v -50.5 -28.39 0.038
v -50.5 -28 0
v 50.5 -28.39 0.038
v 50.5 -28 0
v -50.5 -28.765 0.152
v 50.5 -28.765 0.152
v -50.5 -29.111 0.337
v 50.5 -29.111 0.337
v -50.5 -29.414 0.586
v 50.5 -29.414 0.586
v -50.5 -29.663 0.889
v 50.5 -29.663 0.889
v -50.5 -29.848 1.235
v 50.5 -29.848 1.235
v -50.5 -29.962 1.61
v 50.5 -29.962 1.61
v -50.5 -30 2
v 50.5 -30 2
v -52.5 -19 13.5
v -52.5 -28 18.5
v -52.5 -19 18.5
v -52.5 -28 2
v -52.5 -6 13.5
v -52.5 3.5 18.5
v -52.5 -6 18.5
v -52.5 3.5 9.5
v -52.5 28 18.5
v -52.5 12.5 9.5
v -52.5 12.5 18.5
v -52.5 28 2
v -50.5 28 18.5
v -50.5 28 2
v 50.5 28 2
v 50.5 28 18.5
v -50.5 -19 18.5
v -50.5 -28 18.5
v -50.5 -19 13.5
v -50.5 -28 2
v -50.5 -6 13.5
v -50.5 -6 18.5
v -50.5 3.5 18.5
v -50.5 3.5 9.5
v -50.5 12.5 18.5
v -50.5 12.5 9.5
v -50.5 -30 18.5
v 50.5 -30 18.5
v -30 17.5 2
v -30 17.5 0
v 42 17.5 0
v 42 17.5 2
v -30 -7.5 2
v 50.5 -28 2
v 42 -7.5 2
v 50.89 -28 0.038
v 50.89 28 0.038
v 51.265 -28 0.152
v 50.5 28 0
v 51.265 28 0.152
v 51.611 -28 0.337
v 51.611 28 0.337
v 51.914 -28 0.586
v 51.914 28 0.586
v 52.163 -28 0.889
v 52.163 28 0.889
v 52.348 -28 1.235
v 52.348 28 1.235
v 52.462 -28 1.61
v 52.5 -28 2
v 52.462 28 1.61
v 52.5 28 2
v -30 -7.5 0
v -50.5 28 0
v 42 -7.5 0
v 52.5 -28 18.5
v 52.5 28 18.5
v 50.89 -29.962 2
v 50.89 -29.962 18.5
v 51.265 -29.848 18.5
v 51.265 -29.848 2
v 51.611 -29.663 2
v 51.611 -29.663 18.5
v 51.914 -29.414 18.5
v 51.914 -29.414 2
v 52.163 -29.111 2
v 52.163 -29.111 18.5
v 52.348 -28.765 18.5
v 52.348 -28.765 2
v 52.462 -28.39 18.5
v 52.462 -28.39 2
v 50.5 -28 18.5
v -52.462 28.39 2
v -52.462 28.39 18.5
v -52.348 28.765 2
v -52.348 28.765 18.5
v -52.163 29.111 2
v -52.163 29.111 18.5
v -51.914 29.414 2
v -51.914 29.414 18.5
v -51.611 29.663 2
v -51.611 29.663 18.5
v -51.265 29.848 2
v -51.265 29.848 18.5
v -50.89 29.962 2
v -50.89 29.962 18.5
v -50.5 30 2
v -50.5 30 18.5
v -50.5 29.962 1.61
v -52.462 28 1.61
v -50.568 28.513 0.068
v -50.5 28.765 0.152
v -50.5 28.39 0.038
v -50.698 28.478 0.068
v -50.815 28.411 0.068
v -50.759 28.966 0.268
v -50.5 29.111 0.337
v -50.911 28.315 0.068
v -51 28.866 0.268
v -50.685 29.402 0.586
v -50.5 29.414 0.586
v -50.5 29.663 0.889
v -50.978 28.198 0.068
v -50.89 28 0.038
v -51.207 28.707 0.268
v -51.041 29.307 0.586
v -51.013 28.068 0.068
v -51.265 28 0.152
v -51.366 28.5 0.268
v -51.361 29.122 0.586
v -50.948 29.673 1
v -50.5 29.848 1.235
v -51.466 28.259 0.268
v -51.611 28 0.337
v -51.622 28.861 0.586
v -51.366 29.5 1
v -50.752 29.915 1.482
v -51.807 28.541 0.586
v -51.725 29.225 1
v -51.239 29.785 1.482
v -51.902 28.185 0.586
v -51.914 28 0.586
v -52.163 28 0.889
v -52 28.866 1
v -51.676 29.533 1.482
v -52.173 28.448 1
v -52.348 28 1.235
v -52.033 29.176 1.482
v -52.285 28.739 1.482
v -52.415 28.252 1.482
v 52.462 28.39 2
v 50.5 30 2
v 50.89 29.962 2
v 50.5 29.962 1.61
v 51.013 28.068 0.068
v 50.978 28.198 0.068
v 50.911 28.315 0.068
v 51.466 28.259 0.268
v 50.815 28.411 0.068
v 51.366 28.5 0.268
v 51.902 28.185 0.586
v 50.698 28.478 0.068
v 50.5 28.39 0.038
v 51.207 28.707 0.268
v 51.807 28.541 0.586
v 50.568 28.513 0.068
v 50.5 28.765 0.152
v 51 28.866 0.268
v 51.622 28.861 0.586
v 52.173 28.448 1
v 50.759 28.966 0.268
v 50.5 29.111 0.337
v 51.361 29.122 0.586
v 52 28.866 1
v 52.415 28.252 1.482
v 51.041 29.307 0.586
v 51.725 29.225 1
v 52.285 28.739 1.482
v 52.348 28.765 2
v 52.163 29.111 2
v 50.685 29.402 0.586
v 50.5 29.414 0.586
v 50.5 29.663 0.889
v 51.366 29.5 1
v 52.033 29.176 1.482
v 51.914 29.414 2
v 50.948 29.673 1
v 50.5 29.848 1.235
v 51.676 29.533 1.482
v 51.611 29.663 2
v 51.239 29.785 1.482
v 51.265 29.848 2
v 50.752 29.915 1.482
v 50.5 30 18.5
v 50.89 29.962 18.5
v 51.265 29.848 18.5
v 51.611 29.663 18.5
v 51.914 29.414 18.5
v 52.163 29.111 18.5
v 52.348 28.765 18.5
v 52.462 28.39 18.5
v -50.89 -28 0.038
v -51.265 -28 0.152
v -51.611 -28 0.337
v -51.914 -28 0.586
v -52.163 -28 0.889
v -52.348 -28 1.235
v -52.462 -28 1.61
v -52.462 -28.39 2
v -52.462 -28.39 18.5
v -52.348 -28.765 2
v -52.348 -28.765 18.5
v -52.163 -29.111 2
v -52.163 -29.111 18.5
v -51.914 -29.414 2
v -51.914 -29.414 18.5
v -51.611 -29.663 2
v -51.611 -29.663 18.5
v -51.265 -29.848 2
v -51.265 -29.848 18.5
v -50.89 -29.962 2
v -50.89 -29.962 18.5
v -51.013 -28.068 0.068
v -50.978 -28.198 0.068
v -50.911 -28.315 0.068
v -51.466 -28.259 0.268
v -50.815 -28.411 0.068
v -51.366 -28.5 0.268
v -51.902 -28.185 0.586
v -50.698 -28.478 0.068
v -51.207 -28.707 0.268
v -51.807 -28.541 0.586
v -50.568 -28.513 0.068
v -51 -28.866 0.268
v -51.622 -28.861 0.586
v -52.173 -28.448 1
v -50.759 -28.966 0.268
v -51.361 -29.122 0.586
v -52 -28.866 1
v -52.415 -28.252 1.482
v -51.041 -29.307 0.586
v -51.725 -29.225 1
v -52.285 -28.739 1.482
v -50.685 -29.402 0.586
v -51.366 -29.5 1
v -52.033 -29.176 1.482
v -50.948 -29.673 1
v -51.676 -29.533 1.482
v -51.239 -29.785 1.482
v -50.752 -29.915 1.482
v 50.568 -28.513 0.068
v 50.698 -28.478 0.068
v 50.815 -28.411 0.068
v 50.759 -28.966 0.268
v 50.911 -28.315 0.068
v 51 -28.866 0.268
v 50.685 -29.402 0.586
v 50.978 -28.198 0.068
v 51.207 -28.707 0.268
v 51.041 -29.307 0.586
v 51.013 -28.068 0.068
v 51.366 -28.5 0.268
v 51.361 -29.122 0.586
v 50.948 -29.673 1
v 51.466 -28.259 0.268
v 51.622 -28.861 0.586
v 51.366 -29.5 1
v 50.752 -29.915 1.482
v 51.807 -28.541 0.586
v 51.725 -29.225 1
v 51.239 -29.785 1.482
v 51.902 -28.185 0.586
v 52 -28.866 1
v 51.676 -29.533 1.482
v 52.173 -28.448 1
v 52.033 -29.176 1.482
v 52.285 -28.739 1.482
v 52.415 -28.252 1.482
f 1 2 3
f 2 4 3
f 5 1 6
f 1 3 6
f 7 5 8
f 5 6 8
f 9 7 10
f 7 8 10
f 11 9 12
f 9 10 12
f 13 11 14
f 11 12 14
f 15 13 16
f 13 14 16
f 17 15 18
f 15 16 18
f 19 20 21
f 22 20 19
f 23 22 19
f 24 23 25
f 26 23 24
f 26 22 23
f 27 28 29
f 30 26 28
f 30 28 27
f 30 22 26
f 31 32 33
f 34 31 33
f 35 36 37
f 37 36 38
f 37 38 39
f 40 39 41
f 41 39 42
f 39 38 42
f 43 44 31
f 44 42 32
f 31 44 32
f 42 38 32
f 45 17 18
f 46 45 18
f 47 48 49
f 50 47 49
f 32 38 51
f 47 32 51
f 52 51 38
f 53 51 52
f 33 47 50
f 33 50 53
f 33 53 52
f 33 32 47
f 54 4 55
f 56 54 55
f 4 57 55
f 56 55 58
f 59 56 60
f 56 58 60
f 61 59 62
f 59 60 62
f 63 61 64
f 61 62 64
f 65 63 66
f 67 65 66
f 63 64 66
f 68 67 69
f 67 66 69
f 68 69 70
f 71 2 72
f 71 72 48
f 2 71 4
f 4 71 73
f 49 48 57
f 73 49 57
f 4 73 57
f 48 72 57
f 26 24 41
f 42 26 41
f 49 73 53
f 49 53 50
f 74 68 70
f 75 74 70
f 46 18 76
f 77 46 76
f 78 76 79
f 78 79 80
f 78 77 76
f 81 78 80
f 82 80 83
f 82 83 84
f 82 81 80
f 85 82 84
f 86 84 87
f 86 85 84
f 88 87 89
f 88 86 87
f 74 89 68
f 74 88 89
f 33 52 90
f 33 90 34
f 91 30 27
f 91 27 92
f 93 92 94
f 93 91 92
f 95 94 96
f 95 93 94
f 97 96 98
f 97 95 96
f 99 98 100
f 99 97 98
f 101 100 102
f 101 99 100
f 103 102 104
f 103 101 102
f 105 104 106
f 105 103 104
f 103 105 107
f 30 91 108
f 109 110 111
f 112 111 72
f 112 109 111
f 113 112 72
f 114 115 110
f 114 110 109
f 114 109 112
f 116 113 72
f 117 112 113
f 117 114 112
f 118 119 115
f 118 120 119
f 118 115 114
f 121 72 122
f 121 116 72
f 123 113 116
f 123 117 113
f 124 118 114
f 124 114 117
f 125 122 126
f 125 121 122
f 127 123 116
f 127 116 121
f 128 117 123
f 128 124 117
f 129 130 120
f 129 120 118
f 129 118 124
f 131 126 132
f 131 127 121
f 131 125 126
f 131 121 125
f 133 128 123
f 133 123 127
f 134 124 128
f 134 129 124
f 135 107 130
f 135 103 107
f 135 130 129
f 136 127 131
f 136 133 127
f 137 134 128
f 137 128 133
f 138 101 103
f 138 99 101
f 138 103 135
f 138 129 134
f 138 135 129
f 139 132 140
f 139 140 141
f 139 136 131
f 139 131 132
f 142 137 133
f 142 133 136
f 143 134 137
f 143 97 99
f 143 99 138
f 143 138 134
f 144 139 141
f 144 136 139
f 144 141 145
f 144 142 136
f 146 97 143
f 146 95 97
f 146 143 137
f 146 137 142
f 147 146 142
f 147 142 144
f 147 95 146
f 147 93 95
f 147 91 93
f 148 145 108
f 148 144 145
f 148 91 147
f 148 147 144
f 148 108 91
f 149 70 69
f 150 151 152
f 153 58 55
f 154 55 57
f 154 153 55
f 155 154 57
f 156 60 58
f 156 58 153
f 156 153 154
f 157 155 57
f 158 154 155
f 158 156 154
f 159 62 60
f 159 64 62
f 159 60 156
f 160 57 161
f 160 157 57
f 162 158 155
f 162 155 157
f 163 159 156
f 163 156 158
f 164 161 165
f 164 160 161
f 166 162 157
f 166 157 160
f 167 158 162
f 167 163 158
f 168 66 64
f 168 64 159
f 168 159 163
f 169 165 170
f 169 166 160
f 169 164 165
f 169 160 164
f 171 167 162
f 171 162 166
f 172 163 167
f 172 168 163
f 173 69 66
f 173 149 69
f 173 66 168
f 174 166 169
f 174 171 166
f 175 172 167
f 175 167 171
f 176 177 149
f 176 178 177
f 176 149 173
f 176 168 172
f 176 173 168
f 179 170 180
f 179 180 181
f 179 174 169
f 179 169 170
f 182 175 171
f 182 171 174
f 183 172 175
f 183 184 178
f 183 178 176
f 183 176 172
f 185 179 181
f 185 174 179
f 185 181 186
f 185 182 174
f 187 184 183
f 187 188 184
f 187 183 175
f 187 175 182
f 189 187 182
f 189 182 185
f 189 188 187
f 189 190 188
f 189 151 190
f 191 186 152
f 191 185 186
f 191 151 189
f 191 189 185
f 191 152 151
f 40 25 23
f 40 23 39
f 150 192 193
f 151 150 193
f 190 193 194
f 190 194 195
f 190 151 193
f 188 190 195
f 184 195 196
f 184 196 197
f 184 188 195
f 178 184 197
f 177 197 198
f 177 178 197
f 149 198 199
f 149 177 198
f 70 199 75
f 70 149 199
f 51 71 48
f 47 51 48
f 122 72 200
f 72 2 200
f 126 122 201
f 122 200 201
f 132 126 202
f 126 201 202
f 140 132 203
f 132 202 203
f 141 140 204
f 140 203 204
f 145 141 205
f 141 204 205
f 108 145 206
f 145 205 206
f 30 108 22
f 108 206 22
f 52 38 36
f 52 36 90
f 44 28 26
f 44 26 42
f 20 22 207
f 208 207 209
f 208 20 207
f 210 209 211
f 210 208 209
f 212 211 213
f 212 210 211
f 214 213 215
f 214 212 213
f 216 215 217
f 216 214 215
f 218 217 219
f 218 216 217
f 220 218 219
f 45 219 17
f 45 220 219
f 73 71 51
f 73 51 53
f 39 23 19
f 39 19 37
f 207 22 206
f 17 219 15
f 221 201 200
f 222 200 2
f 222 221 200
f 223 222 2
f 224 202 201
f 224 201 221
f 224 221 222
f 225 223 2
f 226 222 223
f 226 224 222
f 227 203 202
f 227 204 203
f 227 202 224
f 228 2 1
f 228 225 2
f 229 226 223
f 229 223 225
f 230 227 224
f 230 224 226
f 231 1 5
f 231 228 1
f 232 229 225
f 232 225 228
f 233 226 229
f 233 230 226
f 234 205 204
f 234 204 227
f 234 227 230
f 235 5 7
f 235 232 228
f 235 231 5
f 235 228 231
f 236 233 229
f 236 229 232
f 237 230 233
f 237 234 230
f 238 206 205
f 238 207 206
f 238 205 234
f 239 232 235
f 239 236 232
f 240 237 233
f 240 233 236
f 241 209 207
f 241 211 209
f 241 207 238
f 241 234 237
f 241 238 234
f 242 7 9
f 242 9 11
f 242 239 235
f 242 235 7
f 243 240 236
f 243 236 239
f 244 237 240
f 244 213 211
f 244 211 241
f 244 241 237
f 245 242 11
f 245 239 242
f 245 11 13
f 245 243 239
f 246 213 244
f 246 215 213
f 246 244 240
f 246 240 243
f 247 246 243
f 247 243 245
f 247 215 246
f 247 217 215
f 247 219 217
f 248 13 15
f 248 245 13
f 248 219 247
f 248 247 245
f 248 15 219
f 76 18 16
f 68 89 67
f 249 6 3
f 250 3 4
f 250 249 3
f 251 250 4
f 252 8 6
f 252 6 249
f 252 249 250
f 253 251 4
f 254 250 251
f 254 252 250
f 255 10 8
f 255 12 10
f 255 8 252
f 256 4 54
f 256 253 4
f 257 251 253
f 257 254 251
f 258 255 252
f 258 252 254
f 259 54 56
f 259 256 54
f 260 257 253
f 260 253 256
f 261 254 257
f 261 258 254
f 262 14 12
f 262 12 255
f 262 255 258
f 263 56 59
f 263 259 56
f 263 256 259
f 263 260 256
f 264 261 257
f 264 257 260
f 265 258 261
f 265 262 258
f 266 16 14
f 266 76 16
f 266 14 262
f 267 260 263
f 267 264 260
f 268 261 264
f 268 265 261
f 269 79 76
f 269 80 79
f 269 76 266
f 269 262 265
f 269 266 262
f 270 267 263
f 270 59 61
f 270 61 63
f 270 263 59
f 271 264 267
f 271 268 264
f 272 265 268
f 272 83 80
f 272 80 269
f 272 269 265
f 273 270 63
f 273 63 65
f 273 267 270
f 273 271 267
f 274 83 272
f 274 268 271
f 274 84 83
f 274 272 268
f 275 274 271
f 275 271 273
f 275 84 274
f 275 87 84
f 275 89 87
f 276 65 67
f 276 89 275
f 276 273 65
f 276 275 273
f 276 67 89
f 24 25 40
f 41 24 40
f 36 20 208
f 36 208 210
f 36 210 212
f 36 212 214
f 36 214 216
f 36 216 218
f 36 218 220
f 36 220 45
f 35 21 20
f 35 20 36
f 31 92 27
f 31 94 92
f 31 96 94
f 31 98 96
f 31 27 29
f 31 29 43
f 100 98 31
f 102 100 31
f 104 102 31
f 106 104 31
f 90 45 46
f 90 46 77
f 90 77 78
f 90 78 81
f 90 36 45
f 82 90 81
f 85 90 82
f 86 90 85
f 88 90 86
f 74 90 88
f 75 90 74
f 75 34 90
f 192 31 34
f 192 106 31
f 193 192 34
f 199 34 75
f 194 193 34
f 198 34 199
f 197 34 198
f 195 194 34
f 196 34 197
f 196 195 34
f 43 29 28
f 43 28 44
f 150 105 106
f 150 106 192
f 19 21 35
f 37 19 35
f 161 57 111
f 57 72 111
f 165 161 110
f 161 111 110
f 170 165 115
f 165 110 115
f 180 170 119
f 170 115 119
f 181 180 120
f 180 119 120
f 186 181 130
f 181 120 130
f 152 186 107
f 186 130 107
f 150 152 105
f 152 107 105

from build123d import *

# Parameters (mm, degrees)
F0_W     = 105
F0_H     = 60
F0_W_2   = 72
F0_H_2   = 25
F1_DEPTH = 2
F2_W     = 105
F2_H     = 60
F2_W_2   = 101
F2_H_2   = 56
F3_DEPTH = 16.5
F4_W     = 2
F4_H     = 9
F4_H_2   = 13
F5_DEPTH = 9
F6_R     = 2
F7_R     = 2
F8_W     = 2
F8_H     = 13
F9_DEPTH = 4


with BuildPart() as f1:
    # F0 (on Top) → F1 (new body)
    with BuildSketch(Plane.XY):
        Rectangle(F0_W, F0_H)
        with Locations((6, 5)):
            Rectangle(F0_W_2, F0_H_2, mode=Mode.SUBTRACT)
    extrude(amount=F1_DEPTH)

    # F2 (on face) → F3 (join)
    with BuildSketch(Plane.XY.offset(2)):
        Rectangle(F2_W, F2_H)
        Rectangle(F2_W_2, F2_H_2, mode=Mode.SUBTRACT)
    extrude(amount=F3_DEPTH)

    # F4 (on face) → F5 (cut)
    with BuildSketch(Plane.XY.offset(18.5)):
        with Locations((-51.5, 8)):
            Rectangle(F4_W, F4_H)
        with Locations((-51.5, -12.5)):
            Rectangle(F4_W, F4_H_2)
    extrude(amount=-F5_DEPTH, mode=Mode.SUBTRACT)

    # F6
    f6_edges = [f1.edges().sort_by_distance(p)[0] for p in [
        (52.5, -30, 9.25),
        (52.5, 30, 9.25),
        (-52.5, -30, 9.25),
        (-52.5, 30, 9.25),
    ]]
    fillet(f6_edges, radius=F6_R)

    # F7
    f7_edges = [f1.edges().sort_by_distance(p)[0] for p in [
        (52.5, 0, 0),
        (0, -30, 0),
        (0, 30, 0),
        (-52.5, 0, 0),
    ]]
    fillet(f7_edges, radius=F7_R)

    # F8 (on face) → F9 (join)
    with BuildSketch(Plane.XY.offset(9.5)):
        with Locations((-51.5, -12.5)):
            Rectangle(F8_W, F8_H)
    extrude(amount=F9_DEPTH)


solid = f1.part
